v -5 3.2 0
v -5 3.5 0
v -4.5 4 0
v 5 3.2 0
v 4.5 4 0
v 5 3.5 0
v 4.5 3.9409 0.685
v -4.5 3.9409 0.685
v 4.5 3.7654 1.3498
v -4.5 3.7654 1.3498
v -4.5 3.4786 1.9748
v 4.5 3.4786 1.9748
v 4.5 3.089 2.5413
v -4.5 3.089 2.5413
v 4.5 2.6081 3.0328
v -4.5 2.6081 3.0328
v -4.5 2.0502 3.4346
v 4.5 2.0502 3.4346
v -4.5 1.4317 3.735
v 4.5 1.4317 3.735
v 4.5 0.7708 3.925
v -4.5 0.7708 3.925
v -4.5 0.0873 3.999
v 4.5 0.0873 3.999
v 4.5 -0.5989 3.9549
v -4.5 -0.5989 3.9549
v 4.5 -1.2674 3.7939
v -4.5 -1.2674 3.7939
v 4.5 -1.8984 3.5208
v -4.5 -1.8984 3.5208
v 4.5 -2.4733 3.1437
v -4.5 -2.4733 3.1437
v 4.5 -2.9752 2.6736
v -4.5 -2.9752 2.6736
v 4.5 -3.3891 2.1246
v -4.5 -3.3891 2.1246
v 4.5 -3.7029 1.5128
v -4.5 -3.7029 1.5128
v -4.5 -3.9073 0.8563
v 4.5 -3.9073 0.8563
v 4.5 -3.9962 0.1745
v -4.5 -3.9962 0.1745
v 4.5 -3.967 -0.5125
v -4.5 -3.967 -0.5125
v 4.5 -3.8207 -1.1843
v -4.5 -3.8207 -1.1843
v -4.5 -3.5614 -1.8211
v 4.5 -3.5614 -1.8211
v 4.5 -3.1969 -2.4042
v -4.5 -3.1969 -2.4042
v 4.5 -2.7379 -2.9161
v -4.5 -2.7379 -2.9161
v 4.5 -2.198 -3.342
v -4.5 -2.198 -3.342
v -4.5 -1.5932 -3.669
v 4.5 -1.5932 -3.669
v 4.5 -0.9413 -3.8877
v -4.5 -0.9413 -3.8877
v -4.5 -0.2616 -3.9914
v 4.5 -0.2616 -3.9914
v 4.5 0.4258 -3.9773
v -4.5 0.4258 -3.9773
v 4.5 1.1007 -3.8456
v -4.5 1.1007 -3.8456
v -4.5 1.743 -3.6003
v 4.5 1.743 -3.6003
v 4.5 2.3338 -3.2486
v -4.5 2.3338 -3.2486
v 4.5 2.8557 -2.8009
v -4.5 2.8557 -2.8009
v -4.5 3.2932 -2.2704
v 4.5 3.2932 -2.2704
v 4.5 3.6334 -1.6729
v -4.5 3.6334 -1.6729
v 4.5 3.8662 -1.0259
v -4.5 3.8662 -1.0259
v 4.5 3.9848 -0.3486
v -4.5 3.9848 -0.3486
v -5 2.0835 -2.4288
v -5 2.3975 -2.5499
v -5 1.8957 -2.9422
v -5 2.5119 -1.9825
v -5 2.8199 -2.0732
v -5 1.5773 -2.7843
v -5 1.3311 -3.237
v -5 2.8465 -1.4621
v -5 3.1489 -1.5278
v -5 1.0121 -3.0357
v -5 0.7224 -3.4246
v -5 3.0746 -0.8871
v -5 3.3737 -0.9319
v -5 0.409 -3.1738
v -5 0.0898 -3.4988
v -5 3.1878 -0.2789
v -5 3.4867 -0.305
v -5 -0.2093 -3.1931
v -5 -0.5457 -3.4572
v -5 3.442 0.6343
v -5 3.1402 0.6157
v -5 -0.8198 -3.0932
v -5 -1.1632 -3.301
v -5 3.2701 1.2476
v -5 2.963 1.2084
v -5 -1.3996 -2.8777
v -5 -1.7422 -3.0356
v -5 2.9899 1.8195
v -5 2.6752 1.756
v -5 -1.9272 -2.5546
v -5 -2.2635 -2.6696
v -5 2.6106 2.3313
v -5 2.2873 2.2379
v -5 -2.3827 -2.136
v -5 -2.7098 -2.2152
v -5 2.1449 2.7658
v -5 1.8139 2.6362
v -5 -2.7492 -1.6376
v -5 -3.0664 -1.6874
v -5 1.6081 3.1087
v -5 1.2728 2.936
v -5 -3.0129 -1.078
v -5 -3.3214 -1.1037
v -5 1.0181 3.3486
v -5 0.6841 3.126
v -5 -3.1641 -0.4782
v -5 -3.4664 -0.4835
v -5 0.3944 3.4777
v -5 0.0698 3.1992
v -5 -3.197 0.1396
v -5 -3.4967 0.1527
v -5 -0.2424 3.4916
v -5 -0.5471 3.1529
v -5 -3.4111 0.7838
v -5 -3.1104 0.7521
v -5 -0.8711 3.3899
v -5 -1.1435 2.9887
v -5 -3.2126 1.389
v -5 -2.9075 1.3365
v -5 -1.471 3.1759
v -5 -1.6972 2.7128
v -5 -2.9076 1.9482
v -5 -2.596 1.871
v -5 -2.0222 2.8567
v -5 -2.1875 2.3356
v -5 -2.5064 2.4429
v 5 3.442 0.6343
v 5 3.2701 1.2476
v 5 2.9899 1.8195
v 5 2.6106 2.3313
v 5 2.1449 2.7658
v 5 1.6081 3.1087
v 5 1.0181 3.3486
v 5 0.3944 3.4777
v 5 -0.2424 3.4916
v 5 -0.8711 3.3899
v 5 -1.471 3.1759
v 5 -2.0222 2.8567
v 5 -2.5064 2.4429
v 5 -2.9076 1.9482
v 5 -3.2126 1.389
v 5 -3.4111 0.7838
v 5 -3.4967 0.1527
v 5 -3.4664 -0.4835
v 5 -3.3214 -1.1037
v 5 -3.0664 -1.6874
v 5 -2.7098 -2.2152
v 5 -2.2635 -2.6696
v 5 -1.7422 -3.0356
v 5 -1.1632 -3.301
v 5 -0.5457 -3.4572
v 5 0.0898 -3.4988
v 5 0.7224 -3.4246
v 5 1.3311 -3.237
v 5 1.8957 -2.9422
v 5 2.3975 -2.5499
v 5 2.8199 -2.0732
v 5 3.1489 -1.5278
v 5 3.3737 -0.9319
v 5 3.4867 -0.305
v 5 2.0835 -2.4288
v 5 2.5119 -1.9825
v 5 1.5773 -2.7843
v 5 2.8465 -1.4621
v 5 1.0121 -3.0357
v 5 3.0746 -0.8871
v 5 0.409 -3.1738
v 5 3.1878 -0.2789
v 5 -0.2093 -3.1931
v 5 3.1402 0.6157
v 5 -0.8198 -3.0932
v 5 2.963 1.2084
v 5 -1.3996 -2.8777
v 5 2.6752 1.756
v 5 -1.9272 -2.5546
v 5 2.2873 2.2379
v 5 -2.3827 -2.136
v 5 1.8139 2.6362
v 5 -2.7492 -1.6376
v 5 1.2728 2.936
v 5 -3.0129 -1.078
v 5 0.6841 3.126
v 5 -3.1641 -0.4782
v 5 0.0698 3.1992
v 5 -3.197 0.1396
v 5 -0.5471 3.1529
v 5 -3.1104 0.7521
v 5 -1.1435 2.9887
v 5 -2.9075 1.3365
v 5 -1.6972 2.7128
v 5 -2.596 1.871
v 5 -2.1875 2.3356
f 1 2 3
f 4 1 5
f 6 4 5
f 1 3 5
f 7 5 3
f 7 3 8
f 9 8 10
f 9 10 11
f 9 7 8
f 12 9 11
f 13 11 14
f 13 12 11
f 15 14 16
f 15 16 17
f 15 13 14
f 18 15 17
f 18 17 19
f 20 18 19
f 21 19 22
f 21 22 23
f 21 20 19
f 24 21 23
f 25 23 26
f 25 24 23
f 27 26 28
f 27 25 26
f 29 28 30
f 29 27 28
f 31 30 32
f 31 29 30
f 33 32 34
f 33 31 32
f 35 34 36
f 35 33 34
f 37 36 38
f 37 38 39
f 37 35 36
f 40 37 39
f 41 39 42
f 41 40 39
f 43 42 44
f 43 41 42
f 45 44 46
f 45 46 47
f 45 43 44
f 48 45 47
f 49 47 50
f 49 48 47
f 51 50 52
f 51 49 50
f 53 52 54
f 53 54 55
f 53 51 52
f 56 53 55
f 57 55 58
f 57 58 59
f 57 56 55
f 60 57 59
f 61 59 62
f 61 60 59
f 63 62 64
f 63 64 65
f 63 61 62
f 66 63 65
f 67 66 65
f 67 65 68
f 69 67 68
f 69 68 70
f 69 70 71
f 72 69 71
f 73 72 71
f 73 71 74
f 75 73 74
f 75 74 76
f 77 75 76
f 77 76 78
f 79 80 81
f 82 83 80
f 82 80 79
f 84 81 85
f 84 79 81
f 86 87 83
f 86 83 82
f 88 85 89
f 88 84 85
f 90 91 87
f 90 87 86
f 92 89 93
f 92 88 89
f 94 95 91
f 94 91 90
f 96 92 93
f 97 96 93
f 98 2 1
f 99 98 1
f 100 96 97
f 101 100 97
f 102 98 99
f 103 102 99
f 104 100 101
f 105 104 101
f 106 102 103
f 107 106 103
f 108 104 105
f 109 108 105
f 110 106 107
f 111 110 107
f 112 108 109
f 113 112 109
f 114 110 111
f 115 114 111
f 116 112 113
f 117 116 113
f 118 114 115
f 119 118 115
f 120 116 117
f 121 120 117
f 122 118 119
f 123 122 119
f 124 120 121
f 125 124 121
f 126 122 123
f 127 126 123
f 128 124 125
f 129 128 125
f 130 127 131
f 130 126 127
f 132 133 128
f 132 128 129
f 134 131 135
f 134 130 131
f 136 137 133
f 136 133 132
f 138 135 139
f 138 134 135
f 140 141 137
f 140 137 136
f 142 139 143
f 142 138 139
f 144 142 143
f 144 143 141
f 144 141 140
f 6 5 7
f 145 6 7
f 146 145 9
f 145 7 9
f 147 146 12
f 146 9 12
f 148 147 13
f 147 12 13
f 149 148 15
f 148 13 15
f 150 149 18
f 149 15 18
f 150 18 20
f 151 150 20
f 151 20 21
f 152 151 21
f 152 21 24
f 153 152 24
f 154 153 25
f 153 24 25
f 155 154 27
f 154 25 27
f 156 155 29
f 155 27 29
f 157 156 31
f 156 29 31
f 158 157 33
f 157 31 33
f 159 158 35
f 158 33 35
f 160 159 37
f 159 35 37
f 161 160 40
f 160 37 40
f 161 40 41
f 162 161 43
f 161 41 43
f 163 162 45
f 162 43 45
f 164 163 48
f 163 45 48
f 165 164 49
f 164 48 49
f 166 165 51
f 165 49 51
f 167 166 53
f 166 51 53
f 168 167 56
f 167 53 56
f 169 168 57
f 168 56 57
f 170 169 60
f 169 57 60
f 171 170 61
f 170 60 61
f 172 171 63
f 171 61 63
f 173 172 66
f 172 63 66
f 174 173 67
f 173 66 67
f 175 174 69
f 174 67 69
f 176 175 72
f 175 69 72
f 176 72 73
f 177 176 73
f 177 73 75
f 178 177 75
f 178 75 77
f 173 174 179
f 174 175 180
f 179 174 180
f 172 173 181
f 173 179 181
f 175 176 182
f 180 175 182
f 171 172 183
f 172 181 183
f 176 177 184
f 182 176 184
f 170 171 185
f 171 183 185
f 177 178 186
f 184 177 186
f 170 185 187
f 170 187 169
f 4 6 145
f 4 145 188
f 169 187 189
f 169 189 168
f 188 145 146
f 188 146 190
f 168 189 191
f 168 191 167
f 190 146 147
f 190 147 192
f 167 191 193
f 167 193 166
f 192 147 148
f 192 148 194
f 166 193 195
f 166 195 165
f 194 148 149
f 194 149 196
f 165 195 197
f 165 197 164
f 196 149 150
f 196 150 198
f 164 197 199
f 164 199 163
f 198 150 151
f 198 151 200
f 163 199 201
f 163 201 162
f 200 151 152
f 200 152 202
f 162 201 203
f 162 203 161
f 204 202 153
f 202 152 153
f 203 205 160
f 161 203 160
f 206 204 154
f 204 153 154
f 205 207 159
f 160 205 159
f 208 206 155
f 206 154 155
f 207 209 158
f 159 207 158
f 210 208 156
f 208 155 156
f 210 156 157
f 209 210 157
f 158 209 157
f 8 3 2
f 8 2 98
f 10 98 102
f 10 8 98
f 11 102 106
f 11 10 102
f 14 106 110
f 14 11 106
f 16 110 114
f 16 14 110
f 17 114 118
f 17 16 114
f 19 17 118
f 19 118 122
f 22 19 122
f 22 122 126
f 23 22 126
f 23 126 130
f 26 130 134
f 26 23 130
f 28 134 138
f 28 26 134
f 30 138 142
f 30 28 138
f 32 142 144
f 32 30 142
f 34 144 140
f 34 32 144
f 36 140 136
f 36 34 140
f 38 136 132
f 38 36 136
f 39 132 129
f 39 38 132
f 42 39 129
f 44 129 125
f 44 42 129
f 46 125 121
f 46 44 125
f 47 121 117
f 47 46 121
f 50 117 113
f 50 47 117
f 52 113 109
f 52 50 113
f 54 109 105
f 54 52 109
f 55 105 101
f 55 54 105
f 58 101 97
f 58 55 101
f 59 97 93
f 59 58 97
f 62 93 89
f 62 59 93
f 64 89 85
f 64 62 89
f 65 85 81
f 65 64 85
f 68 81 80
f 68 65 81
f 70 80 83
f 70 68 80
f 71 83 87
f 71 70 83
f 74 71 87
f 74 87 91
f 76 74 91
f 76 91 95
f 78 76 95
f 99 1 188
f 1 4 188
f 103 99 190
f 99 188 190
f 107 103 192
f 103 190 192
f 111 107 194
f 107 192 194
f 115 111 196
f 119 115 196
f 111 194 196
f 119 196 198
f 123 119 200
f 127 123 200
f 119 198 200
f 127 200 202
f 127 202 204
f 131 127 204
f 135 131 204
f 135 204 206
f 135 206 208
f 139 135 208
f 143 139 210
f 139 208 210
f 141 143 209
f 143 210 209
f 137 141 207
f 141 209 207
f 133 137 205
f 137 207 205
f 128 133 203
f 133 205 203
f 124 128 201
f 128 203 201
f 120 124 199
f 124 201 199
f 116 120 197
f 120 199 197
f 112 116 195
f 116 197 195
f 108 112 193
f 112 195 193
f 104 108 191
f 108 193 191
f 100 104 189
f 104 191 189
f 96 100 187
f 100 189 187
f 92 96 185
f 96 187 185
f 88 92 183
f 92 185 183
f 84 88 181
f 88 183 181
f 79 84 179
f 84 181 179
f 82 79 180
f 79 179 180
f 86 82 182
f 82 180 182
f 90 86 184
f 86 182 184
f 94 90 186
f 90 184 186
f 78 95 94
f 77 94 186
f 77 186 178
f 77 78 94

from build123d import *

# Parameters (mm, degrees)
ESQUISSE1_W       = 10
ESQUISSE1_H       = 0.8
R_VOLUTION1_ANGLE = 355
CHANFREIN1_SIZE   = 0.5


with BuildPart() as part:
    # Esquisse1 → Révolution1 (revolve)
    with BuildSketch(Plane.XY):
        with Locations((0, 3.6)):
            Rectangle(ESQUISSE1_W, ESQUISSE1_H)
    revolve(axis=Axis((-7.531341075, 0, 0), (1, 0, 0)), revolution_arc=R_VOLUTION1_ANGLE)

    # Chanfrein1
    chanfrein1_edges = [part.edges().sort_by_distance(p)[0] for p in [
        (5, -3.996192886, 0.174477549),
        (-5, -3.996192886, 0.174477549),
    ]]
    chamfer(chanfrein1_edges, length=CHANFREIN1_SIZE)


solid = part.part
